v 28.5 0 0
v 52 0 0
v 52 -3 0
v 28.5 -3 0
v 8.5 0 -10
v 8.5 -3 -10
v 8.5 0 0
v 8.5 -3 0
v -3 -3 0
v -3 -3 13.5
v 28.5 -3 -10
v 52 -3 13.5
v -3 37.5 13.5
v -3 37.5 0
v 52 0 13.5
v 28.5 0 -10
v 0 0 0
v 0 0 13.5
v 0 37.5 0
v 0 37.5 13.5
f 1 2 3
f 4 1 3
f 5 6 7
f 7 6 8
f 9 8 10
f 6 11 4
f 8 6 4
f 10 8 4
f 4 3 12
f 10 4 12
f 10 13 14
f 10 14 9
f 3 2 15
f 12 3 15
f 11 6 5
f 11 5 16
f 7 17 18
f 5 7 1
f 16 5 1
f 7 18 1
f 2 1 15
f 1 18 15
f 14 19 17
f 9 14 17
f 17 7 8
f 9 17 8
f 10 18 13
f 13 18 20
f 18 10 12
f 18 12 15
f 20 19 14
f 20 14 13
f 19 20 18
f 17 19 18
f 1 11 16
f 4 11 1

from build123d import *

# Parameters (mm, degrees)
F0_W     = 52
F0_H     = 13.5
F1_DEPTH = 3
F2_W     = 37.5
F2_H     = 13.5
F2_W_2   = 3
F3_DEPTH = 3
F4_W     = 20
F4_H     = 10
F5_DEPTH = 3


with BuildPart() as f1:
    # F0 (on Front) → F1 (new body)
    with BuildSketch(Plane.XZ):
        with Locations((26, 6.75)):
            Rectangle(F0_W, F0_H)
    extrude(amount=F1_DEPTH)

    # F2 (on face) → F3 (join)
    with BuildSketch(Plane(origin=(0, 0, 0), x_dir=(0, -1, 0), z_dir=(-1, 0, 0))):
        with Locations((-18.75, 6.75)):
            Rectangle(F2_W, F2_H)
        with Locations((1.5, 6.75)):
            Rectangle(F2_W_2, F2_H)
    extrude(amount=F3_DEPTH)

    # F4 (on face) → F5 (join)
    with BuildSketch(Plane.XZ.offset(3)):
        with Locations((18.5, -5)):
            Rectangle(F4_W, F4_H)
    extrude(amount=-F5_DEPTH)


solid = f1.part
